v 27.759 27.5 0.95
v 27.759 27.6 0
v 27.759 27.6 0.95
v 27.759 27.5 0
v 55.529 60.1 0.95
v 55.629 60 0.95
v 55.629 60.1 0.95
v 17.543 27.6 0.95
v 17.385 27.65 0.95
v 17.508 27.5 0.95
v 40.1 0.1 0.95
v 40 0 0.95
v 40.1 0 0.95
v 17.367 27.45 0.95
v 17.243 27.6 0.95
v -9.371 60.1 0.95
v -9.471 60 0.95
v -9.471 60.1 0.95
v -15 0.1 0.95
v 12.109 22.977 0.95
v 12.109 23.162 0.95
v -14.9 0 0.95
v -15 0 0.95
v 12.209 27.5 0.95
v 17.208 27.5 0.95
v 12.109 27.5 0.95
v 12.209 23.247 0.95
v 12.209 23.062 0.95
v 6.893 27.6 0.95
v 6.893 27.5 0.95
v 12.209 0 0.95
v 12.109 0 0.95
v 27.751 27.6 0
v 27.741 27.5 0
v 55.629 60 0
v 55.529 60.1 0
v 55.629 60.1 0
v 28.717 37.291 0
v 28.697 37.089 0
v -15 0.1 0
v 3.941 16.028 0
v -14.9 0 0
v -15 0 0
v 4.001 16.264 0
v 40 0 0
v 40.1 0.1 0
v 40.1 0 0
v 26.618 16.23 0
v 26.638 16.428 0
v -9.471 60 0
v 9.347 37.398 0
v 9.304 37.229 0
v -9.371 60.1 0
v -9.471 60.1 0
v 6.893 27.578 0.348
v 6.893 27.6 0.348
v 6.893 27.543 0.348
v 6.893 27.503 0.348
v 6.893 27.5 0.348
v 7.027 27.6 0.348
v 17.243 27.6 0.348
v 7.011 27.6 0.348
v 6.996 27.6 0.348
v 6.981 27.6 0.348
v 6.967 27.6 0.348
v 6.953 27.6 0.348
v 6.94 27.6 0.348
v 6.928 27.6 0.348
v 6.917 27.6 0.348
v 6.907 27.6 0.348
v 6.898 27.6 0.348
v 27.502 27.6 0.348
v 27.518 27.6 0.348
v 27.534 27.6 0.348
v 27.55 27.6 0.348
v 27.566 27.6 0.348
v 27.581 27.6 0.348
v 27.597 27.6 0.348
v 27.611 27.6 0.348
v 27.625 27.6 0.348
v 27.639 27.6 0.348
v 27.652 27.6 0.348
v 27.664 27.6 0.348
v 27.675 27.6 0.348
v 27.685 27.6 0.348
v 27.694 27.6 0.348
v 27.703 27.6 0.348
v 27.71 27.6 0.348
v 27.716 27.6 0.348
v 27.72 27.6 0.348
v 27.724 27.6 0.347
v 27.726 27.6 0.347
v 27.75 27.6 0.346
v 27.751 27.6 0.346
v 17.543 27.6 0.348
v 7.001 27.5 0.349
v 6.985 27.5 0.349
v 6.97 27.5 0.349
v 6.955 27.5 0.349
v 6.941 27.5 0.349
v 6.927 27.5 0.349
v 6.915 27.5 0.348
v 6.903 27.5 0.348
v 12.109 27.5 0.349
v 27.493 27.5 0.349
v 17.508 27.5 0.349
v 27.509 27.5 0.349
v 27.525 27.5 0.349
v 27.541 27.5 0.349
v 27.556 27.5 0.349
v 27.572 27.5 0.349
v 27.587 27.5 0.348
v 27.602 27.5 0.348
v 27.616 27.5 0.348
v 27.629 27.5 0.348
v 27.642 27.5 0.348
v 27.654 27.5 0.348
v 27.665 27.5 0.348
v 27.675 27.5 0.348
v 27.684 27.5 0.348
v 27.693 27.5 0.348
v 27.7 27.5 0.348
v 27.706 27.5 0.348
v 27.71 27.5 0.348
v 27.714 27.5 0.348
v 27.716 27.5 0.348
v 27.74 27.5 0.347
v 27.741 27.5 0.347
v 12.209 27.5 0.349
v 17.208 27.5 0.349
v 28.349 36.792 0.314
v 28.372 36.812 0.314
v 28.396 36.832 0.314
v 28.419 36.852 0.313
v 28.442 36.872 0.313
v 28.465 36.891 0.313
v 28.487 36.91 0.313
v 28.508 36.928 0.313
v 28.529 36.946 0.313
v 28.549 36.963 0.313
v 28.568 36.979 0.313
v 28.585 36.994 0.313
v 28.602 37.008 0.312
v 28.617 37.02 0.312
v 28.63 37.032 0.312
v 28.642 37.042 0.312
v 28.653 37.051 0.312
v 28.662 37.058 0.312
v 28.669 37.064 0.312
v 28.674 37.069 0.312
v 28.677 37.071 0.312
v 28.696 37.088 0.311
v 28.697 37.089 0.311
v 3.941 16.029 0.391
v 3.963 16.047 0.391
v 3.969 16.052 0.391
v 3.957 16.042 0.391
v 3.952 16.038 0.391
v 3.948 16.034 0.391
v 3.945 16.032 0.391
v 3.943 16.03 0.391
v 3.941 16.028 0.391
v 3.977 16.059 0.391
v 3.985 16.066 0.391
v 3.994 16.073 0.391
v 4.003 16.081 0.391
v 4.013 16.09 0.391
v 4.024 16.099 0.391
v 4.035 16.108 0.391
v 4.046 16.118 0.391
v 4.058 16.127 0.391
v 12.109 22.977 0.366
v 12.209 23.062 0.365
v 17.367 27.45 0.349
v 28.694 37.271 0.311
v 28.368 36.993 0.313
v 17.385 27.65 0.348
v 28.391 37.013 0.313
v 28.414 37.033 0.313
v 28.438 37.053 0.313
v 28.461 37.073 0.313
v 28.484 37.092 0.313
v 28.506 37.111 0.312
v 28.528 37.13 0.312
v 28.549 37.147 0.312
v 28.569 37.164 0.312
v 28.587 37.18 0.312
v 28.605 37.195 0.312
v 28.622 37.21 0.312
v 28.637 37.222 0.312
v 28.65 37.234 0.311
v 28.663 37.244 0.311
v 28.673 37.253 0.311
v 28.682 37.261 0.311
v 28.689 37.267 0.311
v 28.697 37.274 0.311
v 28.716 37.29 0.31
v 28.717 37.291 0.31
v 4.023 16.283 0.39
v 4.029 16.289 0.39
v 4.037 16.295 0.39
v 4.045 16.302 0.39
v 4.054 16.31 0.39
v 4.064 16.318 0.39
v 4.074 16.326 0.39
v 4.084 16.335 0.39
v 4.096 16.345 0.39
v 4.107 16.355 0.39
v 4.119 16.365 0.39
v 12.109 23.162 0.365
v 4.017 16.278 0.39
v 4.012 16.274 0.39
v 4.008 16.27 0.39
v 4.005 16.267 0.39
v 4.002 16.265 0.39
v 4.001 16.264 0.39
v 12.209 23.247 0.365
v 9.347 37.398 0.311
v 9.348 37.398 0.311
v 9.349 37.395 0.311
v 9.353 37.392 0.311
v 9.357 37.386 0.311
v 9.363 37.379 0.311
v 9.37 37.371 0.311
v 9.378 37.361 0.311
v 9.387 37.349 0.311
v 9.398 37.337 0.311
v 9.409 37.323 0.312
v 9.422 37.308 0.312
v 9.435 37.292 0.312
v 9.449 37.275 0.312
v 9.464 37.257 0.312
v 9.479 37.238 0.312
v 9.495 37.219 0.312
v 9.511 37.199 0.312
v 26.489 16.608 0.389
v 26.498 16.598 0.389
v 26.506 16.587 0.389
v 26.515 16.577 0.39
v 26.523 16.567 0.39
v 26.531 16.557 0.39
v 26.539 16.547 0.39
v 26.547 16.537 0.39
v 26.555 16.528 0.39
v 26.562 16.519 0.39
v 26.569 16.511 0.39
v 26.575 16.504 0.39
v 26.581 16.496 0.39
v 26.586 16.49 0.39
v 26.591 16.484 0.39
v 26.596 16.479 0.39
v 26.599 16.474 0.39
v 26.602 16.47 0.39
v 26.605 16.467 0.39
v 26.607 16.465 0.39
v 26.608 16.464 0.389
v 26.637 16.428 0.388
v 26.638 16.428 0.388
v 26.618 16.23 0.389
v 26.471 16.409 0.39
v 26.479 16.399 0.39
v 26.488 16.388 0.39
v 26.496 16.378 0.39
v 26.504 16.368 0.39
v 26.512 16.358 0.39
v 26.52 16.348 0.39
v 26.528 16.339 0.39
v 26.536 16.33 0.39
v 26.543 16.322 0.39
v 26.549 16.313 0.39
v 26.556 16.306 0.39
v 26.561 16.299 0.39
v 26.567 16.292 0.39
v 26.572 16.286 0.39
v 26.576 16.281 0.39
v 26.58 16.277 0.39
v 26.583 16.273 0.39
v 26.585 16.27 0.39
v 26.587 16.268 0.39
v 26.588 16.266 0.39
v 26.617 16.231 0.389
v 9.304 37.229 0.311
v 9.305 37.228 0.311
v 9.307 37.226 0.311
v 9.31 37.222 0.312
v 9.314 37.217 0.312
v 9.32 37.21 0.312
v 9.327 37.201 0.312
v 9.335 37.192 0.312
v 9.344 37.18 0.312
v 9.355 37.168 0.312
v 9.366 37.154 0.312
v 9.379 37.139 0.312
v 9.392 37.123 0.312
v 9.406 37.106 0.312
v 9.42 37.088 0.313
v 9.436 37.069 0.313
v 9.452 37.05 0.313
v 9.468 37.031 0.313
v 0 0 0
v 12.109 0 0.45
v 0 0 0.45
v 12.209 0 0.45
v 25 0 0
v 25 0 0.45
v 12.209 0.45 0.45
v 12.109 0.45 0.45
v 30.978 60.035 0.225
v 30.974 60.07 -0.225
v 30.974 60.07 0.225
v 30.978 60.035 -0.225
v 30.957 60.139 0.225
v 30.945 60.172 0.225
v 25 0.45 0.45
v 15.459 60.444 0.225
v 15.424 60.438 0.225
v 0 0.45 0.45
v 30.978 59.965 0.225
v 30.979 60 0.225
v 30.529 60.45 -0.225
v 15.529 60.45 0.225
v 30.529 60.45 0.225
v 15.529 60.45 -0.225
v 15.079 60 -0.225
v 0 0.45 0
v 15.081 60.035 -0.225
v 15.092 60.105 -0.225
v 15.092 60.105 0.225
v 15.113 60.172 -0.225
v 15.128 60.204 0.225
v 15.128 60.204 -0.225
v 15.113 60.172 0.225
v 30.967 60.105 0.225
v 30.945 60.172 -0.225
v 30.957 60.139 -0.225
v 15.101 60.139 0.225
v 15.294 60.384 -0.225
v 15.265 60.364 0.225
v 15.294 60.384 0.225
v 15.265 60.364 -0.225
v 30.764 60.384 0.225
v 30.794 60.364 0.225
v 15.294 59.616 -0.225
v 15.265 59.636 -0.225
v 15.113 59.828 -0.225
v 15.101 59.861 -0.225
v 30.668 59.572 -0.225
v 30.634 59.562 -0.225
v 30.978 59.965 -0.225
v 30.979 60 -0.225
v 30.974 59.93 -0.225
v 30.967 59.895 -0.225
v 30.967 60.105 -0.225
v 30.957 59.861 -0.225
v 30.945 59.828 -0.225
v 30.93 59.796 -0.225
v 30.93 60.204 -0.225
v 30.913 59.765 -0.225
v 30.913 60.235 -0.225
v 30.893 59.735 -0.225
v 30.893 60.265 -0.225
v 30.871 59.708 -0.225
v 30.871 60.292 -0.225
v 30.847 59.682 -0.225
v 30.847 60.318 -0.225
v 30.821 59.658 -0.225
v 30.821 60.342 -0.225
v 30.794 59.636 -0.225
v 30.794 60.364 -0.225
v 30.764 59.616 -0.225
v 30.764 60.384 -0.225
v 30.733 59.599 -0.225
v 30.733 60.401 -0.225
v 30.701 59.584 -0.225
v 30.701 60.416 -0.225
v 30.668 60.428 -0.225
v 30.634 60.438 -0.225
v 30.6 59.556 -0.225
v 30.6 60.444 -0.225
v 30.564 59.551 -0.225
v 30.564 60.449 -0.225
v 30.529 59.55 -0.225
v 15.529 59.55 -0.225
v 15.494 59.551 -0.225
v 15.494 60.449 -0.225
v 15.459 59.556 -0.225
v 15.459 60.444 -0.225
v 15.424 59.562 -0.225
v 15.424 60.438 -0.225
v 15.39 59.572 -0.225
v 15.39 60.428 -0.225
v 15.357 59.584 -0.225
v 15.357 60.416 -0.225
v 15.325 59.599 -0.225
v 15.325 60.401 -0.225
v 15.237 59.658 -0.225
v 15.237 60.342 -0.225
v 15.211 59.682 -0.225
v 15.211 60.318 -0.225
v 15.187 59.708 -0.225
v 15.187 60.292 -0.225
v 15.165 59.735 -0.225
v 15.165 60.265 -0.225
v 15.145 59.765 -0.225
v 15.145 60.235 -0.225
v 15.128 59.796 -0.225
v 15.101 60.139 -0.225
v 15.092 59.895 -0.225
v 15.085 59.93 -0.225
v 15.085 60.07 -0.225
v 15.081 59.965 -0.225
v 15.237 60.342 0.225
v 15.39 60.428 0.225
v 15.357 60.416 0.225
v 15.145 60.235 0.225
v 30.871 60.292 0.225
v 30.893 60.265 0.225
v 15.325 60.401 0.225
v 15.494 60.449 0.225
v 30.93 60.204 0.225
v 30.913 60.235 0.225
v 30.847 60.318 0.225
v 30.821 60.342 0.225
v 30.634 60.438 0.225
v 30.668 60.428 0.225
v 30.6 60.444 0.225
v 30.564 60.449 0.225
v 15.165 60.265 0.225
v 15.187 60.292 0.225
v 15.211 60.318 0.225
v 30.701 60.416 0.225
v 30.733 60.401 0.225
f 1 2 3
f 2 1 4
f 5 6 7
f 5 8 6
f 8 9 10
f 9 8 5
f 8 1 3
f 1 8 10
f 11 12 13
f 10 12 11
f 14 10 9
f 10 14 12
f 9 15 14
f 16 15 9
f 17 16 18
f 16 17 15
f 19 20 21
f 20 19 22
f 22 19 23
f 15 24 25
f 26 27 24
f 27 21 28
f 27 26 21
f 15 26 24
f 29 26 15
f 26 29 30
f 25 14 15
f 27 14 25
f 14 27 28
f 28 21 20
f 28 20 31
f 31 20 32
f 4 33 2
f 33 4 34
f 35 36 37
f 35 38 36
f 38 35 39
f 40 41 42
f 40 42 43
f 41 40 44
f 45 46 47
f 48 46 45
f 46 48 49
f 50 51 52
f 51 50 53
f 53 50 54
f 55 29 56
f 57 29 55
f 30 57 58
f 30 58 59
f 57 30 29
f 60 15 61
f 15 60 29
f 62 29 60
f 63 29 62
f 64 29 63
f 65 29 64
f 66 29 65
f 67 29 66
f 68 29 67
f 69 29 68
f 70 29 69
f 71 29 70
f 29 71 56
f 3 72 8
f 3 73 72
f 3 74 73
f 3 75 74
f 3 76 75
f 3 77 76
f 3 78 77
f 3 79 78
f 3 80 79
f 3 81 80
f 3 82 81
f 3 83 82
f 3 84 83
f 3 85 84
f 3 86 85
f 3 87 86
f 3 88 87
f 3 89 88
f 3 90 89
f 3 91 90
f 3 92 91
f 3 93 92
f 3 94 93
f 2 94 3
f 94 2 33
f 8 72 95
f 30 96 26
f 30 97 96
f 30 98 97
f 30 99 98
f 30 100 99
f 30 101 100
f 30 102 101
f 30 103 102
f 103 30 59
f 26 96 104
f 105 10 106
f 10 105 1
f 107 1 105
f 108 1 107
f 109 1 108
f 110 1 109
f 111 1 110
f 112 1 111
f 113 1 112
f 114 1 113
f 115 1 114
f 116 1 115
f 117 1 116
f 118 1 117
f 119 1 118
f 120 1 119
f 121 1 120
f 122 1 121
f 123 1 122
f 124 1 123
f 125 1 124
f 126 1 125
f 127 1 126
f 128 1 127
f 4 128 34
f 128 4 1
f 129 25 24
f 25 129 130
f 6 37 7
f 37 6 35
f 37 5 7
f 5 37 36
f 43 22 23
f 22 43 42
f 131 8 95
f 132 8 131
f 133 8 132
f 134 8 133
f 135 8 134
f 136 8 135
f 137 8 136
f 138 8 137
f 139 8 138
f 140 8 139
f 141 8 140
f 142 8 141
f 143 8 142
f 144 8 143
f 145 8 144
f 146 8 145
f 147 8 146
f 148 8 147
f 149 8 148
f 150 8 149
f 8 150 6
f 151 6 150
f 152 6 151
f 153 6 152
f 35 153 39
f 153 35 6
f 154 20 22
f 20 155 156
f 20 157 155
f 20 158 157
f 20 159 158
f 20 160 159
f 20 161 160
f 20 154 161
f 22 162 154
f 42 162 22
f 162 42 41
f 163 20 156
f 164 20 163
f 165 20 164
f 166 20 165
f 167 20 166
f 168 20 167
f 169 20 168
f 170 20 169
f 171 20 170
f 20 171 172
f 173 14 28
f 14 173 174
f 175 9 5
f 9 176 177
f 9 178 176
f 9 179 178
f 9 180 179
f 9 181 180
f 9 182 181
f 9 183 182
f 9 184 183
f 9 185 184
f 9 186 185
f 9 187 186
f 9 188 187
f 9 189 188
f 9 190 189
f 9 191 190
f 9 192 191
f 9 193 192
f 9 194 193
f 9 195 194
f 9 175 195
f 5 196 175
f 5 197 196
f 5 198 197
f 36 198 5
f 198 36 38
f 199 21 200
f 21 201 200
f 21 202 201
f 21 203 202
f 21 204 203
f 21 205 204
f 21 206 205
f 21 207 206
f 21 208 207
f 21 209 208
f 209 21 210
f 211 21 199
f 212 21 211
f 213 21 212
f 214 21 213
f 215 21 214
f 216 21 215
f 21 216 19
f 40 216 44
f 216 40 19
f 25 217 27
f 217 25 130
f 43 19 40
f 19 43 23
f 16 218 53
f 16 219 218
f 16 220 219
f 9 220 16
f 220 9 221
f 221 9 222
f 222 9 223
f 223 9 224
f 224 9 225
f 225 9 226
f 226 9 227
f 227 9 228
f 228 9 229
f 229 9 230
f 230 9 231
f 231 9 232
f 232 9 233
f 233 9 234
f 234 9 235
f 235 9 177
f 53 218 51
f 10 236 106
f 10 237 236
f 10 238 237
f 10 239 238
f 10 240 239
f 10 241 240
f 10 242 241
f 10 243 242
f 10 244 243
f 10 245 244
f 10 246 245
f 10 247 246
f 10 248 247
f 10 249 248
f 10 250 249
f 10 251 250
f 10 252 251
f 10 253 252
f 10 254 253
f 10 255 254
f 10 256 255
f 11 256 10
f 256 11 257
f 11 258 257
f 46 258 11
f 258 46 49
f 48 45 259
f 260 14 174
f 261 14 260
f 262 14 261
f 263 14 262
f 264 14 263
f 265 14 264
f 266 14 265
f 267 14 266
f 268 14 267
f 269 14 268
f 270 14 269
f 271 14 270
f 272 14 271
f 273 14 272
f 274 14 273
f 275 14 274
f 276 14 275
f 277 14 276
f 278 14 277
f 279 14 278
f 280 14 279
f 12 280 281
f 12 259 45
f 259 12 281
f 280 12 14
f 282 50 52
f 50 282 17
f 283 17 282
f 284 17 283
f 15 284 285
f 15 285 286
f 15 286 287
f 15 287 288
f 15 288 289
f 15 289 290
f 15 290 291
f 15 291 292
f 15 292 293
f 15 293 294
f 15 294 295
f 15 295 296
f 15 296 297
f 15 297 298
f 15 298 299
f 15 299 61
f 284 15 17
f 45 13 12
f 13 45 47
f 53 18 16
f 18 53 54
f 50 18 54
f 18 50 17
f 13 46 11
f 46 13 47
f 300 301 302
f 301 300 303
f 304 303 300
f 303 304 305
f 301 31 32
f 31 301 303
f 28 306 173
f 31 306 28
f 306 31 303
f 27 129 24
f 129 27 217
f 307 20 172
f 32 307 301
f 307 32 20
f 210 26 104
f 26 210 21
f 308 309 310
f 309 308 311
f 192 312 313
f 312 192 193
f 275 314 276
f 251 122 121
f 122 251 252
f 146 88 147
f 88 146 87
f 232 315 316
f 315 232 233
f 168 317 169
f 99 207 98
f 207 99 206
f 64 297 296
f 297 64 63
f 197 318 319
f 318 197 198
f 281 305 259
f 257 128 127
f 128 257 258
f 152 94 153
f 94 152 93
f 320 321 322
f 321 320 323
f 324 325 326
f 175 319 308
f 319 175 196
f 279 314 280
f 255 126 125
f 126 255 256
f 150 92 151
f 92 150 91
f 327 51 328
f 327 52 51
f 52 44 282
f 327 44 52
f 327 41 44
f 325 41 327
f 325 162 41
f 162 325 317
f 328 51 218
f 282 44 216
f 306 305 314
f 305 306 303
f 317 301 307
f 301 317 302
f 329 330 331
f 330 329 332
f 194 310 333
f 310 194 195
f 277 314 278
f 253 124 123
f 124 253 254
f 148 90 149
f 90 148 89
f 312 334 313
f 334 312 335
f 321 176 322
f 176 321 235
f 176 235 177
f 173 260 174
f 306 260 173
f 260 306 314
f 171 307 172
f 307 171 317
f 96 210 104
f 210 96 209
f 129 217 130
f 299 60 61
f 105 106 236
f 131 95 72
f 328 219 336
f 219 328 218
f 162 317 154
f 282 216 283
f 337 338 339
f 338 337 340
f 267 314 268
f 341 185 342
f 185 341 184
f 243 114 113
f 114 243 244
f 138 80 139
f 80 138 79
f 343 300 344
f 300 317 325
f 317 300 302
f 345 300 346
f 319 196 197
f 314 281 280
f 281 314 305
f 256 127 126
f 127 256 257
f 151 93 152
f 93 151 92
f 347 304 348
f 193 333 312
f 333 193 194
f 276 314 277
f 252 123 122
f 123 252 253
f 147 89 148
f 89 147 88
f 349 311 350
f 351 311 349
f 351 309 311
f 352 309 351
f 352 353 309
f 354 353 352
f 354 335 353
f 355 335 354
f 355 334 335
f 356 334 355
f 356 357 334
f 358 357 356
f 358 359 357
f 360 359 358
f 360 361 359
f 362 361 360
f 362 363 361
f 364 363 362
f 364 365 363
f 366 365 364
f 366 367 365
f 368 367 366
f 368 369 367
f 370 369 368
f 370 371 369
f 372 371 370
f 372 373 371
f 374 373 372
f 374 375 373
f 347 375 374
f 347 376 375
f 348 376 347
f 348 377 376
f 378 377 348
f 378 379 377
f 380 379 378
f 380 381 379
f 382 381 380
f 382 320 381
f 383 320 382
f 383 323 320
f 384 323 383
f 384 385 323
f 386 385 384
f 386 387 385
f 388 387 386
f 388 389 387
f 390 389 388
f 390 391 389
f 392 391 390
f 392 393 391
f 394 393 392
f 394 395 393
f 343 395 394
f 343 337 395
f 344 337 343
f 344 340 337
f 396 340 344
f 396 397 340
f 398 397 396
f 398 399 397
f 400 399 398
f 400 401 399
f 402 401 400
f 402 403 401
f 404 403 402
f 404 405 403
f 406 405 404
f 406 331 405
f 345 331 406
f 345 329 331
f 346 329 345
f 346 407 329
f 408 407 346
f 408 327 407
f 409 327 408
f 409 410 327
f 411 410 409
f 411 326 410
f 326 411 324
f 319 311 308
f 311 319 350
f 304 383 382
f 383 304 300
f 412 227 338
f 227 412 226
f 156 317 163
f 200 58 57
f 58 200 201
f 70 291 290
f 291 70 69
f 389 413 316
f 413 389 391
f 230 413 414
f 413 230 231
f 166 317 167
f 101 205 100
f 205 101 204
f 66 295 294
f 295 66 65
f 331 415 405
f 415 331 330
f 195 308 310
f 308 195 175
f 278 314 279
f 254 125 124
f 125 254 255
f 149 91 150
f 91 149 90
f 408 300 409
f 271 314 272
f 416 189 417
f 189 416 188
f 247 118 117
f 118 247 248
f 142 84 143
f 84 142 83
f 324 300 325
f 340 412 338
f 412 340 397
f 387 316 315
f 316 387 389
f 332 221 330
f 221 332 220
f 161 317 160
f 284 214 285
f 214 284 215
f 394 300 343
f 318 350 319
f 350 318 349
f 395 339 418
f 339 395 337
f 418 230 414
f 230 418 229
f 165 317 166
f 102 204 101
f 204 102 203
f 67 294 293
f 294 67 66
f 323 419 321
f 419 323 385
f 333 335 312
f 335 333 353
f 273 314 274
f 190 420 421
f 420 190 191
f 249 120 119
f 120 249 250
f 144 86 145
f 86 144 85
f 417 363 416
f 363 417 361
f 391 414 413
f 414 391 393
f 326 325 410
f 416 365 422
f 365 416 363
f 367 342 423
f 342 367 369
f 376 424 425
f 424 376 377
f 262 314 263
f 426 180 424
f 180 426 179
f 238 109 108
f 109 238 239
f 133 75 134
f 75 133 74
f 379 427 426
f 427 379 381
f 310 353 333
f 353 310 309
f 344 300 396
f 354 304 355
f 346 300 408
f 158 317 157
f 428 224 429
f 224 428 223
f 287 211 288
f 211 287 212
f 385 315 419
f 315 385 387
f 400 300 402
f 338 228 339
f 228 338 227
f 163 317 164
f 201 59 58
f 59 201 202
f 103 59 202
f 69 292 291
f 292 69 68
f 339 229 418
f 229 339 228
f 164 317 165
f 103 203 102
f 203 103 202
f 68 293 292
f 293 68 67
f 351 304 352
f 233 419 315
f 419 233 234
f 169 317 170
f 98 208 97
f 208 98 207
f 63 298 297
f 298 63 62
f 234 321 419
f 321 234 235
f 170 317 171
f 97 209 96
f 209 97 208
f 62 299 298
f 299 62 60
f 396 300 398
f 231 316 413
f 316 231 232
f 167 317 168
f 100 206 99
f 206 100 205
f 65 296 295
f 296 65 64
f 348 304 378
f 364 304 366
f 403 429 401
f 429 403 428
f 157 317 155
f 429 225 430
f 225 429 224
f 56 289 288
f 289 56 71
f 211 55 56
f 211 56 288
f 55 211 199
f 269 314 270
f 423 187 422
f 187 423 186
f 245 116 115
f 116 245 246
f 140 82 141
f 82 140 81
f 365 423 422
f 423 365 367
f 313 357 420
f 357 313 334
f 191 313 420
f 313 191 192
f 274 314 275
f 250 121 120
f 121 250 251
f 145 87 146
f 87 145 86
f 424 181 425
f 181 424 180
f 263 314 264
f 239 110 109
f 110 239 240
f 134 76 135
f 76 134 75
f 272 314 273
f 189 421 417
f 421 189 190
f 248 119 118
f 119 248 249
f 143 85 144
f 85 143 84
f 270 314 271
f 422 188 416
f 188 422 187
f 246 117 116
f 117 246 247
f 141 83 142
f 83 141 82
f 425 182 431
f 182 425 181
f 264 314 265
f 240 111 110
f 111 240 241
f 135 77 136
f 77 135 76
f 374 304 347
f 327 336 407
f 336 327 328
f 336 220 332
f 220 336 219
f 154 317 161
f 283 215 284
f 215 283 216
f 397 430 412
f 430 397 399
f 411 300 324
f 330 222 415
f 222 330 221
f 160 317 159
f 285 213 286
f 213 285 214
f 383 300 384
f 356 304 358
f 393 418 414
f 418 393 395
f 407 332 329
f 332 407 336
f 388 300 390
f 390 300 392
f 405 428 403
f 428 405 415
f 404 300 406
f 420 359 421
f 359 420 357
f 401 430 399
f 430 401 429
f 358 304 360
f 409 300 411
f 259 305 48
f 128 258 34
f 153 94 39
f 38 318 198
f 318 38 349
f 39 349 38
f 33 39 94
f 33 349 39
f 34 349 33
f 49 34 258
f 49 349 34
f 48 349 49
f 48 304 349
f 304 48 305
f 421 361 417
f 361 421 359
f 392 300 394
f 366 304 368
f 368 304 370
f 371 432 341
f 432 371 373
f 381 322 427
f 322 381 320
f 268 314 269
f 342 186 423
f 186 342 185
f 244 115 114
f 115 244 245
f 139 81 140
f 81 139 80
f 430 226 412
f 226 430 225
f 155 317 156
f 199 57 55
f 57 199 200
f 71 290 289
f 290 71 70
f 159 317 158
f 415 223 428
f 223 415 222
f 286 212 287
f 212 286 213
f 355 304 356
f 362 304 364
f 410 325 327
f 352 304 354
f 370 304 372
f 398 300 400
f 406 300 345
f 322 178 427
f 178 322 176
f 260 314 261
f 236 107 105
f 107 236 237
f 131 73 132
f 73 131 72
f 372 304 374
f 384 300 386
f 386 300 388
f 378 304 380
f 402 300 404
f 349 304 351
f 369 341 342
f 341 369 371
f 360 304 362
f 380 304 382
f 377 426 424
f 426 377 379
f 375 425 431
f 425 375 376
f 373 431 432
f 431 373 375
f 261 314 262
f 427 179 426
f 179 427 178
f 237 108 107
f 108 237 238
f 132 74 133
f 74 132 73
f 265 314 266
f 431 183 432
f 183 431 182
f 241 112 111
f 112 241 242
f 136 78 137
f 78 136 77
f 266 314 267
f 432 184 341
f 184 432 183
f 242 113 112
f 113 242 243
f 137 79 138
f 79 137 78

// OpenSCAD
/*

Jim Gile
Base Model Aircraft Design

-------------------
Calculations from:
https://www.flitetest.com/articles/easy-aircraft-design
https://www.airfieldmodels.com/information_source/math_and_science_of_model_aircraft/formulas/mean_aerodynamic_chord.htm
-------------------
CWL = This value is chosen by the designer. It is the the Cubic Wing Loading (CWL) of the plane.
    Similar aircraft have a range of CWL which dictates their flight abilities:
    0-4 oz/ft^3 = Gliders
    4-7 oz/ft^3 = Trainers
    7-13 oz/ft^3 = Sport/Aerobatic
    13+ oz/ft^3 = Racing
    Depending on what type of plane you are designing, pick a value to use. This will help
    determine the target weight of your plane in oz.
targetWeight = CWL * (wingArea * sqrt(wingArea)). This is the target weight of your palne in ounces.

MAC = Mean Aerodynamic Chord (MAC) or Geometric Mean Chord (GMC). 
        This  is where all the aerodynamic forces act on a wing.
AC =  This is the Aerodynamic Center of a wing. It is the location along cordRoot.
LAC = This value is chosen by the designer and is the fuselage length between the wingAC and the hStabAC

VH = (hStabArea*(LAC - D + SM)) / (wingArea * MAC). This is the Horizontal Stabilizer Volume (VH).
    Typical values for this are between .35 and .8. Where .35 is less effective and .8 is very effective.

D = LAC * (hStabArea/(wingArea+hStabArea))    This is a measurement to help find the Neutral Point (NP).
SM = MAC / ~10      Static Margin should be from 5% to 15% of the MAC Size. 15% being highly stable
NP = This is the Neutral Point of the plane, it  is like the AC of your entire airplane.
CG = NP - SM. This is the center of gravity of the plane (planeCG). 
    The CG must always be foreward of the NP.

LCG = This value is calculated after the CG is chosen by the designer. 
    It is the fuselage length between the planeCG and the vStabAC.
VV = (vStabArea*LCG)/(wingArea*wingSpan). This is the Vertical Stabilizer Volume (VV).
    Typical values for VV are between .02 and .05. Where .05 is a very effective tail.

-------------------
Other calculations from here:
https://www.flitetest.com/articles/Design_Parameters_for_Scratch_Built_Airframes
-------------------

Everything is based off of the Root Cord (cordRoot) of the main wing.
fuselageForeLen = 1 to 1.5 times the Root Cord. This is the length of the fuselage in front of main wing.
    This should be 30 to 35% of fuselageTotLen in front of the CG.
fuselageAftLen = 2 to 2.4 times the Root Cord. This is the length of the fuselage behind the main wing.
    This should be 65 to 70% of fuselageTotLen behind the CG.
fuselageTotLen = fuselageForeLen + cordRoot + fuselageAftLen

-------------------
Other notes:
-------------------
https://www.radiocontrolinfo.com/rc-calculators/rc-airplane-design-calculator/

https://rcplanes.online/cg_calc.htm
    For an aircraft to be stable in pitch, its CG must be forward of the
    Neutral Point NP by a safety factor called the Static Margin, which
    is a percentage of the MAC (Mean Aerodynamic Chord).
    Static Margin should be between 5% and 15% for a good stability.

    Low Static Margin gives less static stability but greater elevator
    authority, whereas a higher Static Margin results in greater static
    stability but reduces elevator authority.
    Too much Static Margin makes the aircraft nose-heavy, which
    may result in elevator stall at take-off and/or landing.
    Whereas a low Static Margin makes the aircraft tail-heavy and
    susceptible to stall at low speed, e. g. during the landing approach.
    * Choose Low Stabilizer Efficiency if the stab is close to the wing's wake
    or behind a fat fuselage in disturbed flow. Choose T-tail for most gliders.

*/

$fn= 80; // Smoothness setting

// Constants
gramsToOunce = 0.035274;
mmToInch = 0.0393701;
mmToFoot = 0.00328084;

// Big knobs
wingThick = .45;
wingSpan = 120;         //Total length of both wings
cordRoot = 25;          //Width of wing at the root
taperRatio = .6;        //Determines the cord lenght at the tip (cordTip). Normal range is 45% to 100%
leadSweepAngle = 15;    //Leading edge sweep angle of main wing. Normal range is 0 to 20 degrees.
dihedralAngle = 12;     

// Calculated Values
cordTip = cordRoot * taperRatio;
cordSum = cordRoot + cordTip;
wingArea = wingSpan * (cordSum/2);
wingSemiSpan = wingSpan/2;
wingSemiArea = wingArea/2;
wingSemiX1 = cos(90-leadSweepAngle)*wingSemiSpan;
wingSemiX2 = wingSemiX1 + cordTip;
macSize = (2/3)*(cordSum - (cordRoot*cordTip/cordSum)) + wingThick;
macY = (1/3)*((cordRoot + 2*cordTip)/cordSum)*wingSemiSpan;   //0.0 = Root, wingSemiSpan = tip
macX = (cos(90-leadSweepAngle)*macY) - wingThick/2;
aeroCenterX = macX + (macSize/4);

//echo("macSize=",macSize);

mainWing();
showMacAndAcLines();

module showMacAndAcLines() {
    // Calculated MAC or GMC line
    #translate([macX,macY,0])cube([macSize,.1,wingThick+.5]);
    // Geometric MAC Location 1
    #hull() {
        translate([-cordTip,0,0])cube([.1,.1,wingThick+.5]);
        translate([wingSemiX2+cordRoot,wingSemiSpan,0])cube([.1,.1,wingThick+.5]);
    }
    // Geometric MAC Location 2
    #hull() {
        translate([cordRoot+cordTip,0,0])cube([.1,.1,wingThick+.5]);
        translate([wingSemiX1-cordRoot,wingSemiSpan,0])cube([.1,.1,wingThick+.5]);
    }
    // AC Line (Aerodynamic Center)
    #hull() {
        translate([aeroCenterX,0,0])cube([.1,.1,wingThick+.5]);
        translate([aeroCenterX,macY,0])cube([.1,.1,wingThick+.5]);
    }
}

module mainWing() {
    hull() {
        cube(wingThick);
        translate([wingSemiX1,wingSemiSpan,0])cylinder(r=wingThick,h=wingThick,center=true);
        translate([wingSemiX2,wingSemiSpan,0])cylinder(r=wingThick,h=wingThick,center=true);
        translate([cordRoot-wingThick,0,0])cube(wingThick);
    }
}


tk = .45;
base = 150;
minHtRatio = 6;
cir = sqrt(pow(base,2)+pow(base,2));
rad = cir/(2*PI);
diam = 2*rad;
ht = cir/3;
minHt = ht/minHtRatio;
sliceAngle = atan2(ht-minHt,diam);
//echo("cir=",cir,"ht=",ht,"minHt=",minHt,"sliceAngle=",sliceAngle);

//scale([1,1,1]) {
//    //Main Cylinder
//    difference() {
//        cylinder(r=rad,h=ht,center=false);
//        translate([0,0,-1])cylinder(r=rad-(2*tk),h=ht+2,center=false);
//        translate([0,0,minHt])cylinder(r=rad-tk,h=ht,center=false);
//        translate([-(diam+1)/2,-rad,minHt])rotate([sliceAngle,0,0])cube([diam+2,base+2,ht],center=false);
//    }
//    //Upper Wing
//    difference() {
//        translate([0,tk-diam*2.5,0])cylinder(r=diam*2,h=minHt,center=false);
//        translate([0,tk-diam*2.5,-1])cylinder(r=diam*2-tk,h=minHt+2,center=false);
//        translate([diam*2+base/2,-diam*2.5,minHt/2])cube([diam*4,diam*4,minHt*2],center=true);
//        translate([-diam*2-base/2,-diam*2.5,minHt/2])cube([diam*4,diam*4,minHt*2],center=true);
//        translate([0,-diam*3,minHt/2])cube([diam*4,diam*4,minHt*2],center=true);
//    }
//    //Rudder
//    hull() {
//        translate([0,rad,minHt/2])cube([tk,rad/8,minHt],center=true);
//        translate([0,rad,ht-minHt/2])cube([tk,rad/8,minHt],center=true);
//    }    
//}
